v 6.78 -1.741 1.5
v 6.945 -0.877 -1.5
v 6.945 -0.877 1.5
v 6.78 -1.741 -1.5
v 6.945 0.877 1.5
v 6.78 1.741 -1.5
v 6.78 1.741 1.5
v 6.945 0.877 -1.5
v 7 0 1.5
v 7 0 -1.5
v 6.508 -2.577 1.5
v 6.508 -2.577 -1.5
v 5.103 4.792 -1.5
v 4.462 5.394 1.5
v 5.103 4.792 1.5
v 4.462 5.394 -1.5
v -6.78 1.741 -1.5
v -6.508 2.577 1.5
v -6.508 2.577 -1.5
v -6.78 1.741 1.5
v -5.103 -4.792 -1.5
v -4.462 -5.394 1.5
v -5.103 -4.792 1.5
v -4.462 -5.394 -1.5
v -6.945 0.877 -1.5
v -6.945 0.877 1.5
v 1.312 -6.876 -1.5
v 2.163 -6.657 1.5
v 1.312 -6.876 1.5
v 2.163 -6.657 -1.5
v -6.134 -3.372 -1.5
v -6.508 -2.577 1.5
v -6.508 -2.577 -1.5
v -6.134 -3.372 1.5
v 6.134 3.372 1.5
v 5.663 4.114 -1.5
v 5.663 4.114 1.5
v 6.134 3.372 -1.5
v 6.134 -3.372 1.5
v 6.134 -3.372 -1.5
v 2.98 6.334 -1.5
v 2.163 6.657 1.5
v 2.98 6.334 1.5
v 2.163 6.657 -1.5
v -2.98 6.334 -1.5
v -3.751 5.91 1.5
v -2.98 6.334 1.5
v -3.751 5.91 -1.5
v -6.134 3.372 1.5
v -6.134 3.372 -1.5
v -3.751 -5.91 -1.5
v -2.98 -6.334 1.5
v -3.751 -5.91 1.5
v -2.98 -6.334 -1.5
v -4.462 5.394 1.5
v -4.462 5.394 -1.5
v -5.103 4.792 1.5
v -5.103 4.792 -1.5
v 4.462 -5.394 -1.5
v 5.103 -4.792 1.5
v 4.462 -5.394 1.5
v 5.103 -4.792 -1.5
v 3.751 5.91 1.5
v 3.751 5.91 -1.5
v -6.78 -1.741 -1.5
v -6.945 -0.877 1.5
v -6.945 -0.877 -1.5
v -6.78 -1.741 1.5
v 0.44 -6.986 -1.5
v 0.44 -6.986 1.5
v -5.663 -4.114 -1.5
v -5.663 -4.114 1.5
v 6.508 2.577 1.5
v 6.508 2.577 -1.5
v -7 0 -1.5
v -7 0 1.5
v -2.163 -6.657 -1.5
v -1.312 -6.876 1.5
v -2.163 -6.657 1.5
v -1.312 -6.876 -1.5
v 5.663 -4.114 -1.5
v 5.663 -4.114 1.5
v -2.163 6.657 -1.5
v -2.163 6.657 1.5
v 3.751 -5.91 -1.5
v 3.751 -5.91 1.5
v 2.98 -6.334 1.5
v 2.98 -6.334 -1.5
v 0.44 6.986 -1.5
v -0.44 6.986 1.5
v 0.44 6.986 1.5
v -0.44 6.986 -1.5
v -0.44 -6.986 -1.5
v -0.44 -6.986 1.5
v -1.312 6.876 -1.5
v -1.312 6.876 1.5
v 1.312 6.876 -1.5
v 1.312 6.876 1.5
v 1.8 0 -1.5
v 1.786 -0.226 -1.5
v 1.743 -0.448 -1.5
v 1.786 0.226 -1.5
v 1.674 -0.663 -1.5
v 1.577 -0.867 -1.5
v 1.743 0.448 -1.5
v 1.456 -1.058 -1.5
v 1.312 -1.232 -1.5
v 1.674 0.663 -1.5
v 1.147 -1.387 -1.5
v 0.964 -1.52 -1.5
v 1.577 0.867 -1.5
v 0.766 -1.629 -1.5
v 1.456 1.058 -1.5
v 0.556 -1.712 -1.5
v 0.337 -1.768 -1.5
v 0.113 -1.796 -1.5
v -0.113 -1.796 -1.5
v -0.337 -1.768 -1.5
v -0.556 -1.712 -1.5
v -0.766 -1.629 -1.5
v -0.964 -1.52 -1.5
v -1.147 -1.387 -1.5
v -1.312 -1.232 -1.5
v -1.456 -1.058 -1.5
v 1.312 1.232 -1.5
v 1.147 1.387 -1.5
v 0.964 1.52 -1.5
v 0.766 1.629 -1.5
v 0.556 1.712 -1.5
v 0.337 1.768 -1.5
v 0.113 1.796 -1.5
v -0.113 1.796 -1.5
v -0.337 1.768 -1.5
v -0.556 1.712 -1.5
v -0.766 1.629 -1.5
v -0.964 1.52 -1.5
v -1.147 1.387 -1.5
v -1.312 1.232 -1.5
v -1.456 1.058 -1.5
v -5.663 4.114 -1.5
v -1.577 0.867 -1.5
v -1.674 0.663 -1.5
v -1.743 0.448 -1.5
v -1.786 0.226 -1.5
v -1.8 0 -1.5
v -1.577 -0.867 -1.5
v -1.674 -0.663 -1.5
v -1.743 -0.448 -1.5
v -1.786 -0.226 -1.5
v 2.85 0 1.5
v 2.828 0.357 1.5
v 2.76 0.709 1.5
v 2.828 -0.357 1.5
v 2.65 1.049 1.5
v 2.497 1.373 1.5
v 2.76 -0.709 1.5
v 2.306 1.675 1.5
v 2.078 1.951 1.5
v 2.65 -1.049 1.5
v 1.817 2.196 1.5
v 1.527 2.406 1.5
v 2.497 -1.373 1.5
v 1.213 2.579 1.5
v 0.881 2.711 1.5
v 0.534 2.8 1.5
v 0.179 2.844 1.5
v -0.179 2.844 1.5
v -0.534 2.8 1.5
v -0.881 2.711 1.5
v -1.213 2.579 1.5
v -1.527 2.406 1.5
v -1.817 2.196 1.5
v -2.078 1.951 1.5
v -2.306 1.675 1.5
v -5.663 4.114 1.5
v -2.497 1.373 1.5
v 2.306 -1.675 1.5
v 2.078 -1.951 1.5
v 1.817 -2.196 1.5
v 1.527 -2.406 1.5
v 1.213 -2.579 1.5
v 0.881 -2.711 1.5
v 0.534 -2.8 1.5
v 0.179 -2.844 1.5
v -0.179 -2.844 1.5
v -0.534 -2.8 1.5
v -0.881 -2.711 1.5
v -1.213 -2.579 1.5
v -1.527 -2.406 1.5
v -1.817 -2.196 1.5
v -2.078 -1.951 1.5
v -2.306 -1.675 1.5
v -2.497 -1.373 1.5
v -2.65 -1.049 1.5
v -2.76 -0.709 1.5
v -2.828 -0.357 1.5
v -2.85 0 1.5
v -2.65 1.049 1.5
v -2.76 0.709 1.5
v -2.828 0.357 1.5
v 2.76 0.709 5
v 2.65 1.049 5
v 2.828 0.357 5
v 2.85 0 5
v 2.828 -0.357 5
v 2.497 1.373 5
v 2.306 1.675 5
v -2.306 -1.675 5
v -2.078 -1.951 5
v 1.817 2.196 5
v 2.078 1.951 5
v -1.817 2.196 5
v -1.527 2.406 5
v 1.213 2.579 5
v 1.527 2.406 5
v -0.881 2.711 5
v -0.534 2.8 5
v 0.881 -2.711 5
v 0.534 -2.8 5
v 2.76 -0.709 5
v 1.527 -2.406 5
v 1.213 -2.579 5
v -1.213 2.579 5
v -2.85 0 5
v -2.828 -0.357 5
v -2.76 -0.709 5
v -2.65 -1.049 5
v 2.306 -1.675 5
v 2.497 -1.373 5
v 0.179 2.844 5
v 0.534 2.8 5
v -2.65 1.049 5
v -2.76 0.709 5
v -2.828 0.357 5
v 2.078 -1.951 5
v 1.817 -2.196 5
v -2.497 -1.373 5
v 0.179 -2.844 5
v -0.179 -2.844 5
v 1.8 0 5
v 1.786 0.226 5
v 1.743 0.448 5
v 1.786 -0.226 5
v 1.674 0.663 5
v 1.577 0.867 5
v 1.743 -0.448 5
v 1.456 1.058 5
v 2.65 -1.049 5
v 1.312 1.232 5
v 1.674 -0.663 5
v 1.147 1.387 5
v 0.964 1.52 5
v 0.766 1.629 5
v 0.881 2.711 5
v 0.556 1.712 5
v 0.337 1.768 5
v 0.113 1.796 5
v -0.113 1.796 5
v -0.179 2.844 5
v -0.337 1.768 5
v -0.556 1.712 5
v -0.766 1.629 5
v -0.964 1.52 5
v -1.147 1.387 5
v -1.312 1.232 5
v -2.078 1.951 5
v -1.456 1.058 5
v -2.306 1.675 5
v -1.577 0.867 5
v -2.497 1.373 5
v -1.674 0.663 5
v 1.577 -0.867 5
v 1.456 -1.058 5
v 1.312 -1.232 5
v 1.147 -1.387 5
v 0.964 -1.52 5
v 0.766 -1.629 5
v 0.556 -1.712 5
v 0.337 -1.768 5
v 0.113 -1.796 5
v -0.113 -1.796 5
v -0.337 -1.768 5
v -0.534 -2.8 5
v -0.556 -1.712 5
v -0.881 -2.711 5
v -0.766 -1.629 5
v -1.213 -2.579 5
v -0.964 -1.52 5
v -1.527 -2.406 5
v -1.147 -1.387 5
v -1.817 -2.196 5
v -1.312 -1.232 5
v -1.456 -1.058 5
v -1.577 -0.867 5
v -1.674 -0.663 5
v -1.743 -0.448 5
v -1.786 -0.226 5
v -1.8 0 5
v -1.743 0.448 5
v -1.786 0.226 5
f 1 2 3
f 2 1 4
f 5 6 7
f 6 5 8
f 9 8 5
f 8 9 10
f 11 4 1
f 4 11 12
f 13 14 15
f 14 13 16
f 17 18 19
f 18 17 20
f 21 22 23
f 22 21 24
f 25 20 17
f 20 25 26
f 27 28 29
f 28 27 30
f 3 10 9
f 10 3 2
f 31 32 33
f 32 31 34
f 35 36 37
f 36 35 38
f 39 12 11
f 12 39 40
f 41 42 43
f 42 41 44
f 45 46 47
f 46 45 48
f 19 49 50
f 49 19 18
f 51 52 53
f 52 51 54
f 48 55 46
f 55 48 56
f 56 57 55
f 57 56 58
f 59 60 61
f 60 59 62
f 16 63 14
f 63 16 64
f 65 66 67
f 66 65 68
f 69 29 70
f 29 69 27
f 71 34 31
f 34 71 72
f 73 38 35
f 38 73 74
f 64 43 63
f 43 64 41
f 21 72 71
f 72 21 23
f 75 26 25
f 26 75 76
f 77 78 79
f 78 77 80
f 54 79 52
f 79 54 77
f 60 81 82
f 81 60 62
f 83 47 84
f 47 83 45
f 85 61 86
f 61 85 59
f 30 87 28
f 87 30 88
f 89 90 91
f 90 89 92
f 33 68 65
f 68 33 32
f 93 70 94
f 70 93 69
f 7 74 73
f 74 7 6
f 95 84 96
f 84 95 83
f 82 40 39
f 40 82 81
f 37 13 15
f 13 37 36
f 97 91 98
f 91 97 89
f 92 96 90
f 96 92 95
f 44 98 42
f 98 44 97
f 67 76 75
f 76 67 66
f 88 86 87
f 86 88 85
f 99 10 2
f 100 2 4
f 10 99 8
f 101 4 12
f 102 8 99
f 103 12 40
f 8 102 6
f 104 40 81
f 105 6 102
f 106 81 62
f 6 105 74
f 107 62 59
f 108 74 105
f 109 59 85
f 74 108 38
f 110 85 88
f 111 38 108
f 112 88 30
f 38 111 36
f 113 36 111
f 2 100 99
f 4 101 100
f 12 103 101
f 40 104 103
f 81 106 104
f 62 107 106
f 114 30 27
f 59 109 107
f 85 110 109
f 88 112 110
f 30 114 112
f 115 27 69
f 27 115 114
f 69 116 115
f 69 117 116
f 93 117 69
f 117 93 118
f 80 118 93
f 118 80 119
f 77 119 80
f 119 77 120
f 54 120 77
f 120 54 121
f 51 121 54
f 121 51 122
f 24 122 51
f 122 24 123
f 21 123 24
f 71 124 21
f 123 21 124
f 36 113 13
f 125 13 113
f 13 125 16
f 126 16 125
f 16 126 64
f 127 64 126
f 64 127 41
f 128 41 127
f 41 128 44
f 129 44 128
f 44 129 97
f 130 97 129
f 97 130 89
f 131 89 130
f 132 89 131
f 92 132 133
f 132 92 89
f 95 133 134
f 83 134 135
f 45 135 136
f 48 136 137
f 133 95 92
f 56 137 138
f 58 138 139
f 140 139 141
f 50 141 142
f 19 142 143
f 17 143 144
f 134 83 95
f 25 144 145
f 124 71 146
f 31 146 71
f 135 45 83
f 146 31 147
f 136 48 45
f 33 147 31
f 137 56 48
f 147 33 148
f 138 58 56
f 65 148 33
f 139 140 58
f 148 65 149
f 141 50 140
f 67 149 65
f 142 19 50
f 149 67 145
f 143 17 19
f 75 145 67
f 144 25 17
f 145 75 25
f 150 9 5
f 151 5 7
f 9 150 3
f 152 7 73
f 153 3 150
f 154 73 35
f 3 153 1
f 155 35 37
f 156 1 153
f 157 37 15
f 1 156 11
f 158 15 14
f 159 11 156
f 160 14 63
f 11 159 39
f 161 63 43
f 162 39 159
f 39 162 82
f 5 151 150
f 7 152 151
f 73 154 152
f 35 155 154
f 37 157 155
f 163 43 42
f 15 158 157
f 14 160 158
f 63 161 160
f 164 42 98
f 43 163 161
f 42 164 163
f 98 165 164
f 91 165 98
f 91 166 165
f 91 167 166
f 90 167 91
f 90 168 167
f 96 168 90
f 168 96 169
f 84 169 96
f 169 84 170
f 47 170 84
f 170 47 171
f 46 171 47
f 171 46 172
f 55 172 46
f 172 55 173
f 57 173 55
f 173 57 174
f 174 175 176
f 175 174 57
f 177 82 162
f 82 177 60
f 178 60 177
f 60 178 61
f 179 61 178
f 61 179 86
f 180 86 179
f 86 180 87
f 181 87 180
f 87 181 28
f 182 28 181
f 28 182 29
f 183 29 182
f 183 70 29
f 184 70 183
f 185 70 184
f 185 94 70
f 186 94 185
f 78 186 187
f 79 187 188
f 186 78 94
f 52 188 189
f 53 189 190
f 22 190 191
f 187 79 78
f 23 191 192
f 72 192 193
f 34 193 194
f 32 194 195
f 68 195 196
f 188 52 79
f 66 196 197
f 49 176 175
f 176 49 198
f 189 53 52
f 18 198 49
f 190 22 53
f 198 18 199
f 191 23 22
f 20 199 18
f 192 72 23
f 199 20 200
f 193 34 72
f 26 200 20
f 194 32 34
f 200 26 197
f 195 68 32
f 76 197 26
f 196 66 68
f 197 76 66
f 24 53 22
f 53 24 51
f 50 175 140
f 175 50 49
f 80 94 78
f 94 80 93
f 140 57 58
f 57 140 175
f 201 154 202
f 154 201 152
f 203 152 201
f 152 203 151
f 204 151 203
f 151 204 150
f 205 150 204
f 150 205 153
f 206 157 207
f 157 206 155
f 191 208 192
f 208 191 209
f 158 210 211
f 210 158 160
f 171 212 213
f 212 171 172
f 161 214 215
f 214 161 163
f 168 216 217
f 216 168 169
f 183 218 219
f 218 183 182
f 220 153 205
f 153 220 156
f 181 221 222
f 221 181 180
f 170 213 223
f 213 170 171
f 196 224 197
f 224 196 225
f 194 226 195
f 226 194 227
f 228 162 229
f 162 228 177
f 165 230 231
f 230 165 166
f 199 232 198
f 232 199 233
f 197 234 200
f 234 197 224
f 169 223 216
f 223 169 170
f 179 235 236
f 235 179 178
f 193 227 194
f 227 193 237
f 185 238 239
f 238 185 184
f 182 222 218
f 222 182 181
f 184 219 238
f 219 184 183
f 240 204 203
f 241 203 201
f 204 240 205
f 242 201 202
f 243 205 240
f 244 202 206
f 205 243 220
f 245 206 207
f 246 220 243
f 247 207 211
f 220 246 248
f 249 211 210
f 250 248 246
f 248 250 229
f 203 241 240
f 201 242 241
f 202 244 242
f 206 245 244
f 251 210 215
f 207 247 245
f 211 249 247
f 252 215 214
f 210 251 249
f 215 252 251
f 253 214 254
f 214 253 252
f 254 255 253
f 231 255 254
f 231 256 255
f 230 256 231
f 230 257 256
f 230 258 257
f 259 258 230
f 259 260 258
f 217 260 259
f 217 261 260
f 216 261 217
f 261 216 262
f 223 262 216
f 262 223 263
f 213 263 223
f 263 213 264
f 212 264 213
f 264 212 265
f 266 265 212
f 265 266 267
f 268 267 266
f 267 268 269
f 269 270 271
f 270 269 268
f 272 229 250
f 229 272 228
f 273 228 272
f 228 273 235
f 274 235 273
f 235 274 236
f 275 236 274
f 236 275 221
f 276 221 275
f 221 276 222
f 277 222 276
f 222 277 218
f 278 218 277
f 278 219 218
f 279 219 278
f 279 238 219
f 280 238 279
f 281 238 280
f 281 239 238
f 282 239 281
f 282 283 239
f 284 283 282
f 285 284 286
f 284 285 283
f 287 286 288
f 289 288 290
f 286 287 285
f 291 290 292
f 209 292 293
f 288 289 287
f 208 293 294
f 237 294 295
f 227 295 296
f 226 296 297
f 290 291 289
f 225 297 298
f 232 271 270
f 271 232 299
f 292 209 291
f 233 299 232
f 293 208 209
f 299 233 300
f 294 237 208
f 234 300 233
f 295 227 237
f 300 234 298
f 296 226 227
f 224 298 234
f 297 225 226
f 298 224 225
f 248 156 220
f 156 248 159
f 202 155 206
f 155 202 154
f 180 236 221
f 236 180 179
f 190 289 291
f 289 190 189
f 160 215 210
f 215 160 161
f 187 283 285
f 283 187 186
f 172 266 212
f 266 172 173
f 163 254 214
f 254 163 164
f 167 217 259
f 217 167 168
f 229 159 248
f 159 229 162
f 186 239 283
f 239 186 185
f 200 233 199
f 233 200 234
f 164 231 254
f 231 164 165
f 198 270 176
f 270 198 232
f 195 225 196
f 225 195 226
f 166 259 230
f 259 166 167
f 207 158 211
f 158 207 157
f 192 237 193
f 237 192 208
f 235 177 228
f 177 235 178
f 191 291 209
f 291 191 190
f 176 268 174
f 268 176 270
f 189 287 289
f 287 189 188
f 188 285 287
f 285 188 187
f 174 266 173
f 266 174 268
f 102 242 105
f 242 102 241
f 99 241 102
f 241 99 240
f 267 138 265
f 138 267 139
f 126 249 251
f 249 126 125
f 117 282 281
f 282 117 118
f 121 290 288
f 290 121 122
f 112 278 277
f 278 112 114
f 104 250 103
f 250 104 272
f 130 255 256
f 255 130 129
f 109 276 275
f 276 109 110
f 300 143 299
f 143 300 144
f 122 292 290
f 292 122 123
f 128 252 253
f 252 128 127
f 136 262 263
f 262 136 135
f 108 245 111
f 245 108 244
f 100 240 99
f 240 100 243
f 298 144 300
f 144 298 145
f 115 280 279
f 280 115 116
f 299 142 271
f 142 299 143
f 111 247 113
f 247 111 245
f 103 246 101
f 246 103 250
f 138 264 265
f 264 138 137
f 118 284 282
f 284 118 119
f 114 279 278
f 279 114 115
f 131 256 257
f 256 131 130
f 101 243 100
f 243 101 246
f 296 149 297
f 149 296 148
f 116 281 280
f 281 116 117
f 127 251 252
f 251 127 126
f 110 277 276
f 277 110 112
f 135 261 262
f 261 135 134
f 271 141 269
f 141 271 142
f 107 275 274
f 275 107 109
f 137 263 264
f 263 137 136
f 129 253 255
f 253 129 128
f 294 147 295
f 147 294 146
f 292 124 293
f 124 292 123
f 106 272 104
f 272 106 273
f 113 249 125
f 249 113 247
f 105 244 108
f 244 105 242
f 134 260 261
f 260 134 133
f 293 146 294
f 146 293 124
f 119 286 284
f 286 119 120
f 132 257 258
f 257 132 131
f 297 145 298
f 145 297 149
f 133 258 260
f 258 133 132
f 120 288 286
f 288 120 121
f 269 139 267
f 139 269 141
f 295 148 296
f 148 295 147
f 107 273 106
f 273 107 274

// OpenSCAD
$fn = 50;


difference() {
	union() {
		translate(v = [0, 0, -1.5000000000]) {
			cylinder(h = 3, r = 7.0000000000);
		}
		translate(v = [0, 0, -1.5000000000]) {
			cylinder(h = 6.5000000000, r = 2.8500000000);
		}
	}
	union() {
		translate(v = [0, 0, -100.0000000000]) {
			cylinder(h = 200, r = 1.8000000000);
		}
	}
}
